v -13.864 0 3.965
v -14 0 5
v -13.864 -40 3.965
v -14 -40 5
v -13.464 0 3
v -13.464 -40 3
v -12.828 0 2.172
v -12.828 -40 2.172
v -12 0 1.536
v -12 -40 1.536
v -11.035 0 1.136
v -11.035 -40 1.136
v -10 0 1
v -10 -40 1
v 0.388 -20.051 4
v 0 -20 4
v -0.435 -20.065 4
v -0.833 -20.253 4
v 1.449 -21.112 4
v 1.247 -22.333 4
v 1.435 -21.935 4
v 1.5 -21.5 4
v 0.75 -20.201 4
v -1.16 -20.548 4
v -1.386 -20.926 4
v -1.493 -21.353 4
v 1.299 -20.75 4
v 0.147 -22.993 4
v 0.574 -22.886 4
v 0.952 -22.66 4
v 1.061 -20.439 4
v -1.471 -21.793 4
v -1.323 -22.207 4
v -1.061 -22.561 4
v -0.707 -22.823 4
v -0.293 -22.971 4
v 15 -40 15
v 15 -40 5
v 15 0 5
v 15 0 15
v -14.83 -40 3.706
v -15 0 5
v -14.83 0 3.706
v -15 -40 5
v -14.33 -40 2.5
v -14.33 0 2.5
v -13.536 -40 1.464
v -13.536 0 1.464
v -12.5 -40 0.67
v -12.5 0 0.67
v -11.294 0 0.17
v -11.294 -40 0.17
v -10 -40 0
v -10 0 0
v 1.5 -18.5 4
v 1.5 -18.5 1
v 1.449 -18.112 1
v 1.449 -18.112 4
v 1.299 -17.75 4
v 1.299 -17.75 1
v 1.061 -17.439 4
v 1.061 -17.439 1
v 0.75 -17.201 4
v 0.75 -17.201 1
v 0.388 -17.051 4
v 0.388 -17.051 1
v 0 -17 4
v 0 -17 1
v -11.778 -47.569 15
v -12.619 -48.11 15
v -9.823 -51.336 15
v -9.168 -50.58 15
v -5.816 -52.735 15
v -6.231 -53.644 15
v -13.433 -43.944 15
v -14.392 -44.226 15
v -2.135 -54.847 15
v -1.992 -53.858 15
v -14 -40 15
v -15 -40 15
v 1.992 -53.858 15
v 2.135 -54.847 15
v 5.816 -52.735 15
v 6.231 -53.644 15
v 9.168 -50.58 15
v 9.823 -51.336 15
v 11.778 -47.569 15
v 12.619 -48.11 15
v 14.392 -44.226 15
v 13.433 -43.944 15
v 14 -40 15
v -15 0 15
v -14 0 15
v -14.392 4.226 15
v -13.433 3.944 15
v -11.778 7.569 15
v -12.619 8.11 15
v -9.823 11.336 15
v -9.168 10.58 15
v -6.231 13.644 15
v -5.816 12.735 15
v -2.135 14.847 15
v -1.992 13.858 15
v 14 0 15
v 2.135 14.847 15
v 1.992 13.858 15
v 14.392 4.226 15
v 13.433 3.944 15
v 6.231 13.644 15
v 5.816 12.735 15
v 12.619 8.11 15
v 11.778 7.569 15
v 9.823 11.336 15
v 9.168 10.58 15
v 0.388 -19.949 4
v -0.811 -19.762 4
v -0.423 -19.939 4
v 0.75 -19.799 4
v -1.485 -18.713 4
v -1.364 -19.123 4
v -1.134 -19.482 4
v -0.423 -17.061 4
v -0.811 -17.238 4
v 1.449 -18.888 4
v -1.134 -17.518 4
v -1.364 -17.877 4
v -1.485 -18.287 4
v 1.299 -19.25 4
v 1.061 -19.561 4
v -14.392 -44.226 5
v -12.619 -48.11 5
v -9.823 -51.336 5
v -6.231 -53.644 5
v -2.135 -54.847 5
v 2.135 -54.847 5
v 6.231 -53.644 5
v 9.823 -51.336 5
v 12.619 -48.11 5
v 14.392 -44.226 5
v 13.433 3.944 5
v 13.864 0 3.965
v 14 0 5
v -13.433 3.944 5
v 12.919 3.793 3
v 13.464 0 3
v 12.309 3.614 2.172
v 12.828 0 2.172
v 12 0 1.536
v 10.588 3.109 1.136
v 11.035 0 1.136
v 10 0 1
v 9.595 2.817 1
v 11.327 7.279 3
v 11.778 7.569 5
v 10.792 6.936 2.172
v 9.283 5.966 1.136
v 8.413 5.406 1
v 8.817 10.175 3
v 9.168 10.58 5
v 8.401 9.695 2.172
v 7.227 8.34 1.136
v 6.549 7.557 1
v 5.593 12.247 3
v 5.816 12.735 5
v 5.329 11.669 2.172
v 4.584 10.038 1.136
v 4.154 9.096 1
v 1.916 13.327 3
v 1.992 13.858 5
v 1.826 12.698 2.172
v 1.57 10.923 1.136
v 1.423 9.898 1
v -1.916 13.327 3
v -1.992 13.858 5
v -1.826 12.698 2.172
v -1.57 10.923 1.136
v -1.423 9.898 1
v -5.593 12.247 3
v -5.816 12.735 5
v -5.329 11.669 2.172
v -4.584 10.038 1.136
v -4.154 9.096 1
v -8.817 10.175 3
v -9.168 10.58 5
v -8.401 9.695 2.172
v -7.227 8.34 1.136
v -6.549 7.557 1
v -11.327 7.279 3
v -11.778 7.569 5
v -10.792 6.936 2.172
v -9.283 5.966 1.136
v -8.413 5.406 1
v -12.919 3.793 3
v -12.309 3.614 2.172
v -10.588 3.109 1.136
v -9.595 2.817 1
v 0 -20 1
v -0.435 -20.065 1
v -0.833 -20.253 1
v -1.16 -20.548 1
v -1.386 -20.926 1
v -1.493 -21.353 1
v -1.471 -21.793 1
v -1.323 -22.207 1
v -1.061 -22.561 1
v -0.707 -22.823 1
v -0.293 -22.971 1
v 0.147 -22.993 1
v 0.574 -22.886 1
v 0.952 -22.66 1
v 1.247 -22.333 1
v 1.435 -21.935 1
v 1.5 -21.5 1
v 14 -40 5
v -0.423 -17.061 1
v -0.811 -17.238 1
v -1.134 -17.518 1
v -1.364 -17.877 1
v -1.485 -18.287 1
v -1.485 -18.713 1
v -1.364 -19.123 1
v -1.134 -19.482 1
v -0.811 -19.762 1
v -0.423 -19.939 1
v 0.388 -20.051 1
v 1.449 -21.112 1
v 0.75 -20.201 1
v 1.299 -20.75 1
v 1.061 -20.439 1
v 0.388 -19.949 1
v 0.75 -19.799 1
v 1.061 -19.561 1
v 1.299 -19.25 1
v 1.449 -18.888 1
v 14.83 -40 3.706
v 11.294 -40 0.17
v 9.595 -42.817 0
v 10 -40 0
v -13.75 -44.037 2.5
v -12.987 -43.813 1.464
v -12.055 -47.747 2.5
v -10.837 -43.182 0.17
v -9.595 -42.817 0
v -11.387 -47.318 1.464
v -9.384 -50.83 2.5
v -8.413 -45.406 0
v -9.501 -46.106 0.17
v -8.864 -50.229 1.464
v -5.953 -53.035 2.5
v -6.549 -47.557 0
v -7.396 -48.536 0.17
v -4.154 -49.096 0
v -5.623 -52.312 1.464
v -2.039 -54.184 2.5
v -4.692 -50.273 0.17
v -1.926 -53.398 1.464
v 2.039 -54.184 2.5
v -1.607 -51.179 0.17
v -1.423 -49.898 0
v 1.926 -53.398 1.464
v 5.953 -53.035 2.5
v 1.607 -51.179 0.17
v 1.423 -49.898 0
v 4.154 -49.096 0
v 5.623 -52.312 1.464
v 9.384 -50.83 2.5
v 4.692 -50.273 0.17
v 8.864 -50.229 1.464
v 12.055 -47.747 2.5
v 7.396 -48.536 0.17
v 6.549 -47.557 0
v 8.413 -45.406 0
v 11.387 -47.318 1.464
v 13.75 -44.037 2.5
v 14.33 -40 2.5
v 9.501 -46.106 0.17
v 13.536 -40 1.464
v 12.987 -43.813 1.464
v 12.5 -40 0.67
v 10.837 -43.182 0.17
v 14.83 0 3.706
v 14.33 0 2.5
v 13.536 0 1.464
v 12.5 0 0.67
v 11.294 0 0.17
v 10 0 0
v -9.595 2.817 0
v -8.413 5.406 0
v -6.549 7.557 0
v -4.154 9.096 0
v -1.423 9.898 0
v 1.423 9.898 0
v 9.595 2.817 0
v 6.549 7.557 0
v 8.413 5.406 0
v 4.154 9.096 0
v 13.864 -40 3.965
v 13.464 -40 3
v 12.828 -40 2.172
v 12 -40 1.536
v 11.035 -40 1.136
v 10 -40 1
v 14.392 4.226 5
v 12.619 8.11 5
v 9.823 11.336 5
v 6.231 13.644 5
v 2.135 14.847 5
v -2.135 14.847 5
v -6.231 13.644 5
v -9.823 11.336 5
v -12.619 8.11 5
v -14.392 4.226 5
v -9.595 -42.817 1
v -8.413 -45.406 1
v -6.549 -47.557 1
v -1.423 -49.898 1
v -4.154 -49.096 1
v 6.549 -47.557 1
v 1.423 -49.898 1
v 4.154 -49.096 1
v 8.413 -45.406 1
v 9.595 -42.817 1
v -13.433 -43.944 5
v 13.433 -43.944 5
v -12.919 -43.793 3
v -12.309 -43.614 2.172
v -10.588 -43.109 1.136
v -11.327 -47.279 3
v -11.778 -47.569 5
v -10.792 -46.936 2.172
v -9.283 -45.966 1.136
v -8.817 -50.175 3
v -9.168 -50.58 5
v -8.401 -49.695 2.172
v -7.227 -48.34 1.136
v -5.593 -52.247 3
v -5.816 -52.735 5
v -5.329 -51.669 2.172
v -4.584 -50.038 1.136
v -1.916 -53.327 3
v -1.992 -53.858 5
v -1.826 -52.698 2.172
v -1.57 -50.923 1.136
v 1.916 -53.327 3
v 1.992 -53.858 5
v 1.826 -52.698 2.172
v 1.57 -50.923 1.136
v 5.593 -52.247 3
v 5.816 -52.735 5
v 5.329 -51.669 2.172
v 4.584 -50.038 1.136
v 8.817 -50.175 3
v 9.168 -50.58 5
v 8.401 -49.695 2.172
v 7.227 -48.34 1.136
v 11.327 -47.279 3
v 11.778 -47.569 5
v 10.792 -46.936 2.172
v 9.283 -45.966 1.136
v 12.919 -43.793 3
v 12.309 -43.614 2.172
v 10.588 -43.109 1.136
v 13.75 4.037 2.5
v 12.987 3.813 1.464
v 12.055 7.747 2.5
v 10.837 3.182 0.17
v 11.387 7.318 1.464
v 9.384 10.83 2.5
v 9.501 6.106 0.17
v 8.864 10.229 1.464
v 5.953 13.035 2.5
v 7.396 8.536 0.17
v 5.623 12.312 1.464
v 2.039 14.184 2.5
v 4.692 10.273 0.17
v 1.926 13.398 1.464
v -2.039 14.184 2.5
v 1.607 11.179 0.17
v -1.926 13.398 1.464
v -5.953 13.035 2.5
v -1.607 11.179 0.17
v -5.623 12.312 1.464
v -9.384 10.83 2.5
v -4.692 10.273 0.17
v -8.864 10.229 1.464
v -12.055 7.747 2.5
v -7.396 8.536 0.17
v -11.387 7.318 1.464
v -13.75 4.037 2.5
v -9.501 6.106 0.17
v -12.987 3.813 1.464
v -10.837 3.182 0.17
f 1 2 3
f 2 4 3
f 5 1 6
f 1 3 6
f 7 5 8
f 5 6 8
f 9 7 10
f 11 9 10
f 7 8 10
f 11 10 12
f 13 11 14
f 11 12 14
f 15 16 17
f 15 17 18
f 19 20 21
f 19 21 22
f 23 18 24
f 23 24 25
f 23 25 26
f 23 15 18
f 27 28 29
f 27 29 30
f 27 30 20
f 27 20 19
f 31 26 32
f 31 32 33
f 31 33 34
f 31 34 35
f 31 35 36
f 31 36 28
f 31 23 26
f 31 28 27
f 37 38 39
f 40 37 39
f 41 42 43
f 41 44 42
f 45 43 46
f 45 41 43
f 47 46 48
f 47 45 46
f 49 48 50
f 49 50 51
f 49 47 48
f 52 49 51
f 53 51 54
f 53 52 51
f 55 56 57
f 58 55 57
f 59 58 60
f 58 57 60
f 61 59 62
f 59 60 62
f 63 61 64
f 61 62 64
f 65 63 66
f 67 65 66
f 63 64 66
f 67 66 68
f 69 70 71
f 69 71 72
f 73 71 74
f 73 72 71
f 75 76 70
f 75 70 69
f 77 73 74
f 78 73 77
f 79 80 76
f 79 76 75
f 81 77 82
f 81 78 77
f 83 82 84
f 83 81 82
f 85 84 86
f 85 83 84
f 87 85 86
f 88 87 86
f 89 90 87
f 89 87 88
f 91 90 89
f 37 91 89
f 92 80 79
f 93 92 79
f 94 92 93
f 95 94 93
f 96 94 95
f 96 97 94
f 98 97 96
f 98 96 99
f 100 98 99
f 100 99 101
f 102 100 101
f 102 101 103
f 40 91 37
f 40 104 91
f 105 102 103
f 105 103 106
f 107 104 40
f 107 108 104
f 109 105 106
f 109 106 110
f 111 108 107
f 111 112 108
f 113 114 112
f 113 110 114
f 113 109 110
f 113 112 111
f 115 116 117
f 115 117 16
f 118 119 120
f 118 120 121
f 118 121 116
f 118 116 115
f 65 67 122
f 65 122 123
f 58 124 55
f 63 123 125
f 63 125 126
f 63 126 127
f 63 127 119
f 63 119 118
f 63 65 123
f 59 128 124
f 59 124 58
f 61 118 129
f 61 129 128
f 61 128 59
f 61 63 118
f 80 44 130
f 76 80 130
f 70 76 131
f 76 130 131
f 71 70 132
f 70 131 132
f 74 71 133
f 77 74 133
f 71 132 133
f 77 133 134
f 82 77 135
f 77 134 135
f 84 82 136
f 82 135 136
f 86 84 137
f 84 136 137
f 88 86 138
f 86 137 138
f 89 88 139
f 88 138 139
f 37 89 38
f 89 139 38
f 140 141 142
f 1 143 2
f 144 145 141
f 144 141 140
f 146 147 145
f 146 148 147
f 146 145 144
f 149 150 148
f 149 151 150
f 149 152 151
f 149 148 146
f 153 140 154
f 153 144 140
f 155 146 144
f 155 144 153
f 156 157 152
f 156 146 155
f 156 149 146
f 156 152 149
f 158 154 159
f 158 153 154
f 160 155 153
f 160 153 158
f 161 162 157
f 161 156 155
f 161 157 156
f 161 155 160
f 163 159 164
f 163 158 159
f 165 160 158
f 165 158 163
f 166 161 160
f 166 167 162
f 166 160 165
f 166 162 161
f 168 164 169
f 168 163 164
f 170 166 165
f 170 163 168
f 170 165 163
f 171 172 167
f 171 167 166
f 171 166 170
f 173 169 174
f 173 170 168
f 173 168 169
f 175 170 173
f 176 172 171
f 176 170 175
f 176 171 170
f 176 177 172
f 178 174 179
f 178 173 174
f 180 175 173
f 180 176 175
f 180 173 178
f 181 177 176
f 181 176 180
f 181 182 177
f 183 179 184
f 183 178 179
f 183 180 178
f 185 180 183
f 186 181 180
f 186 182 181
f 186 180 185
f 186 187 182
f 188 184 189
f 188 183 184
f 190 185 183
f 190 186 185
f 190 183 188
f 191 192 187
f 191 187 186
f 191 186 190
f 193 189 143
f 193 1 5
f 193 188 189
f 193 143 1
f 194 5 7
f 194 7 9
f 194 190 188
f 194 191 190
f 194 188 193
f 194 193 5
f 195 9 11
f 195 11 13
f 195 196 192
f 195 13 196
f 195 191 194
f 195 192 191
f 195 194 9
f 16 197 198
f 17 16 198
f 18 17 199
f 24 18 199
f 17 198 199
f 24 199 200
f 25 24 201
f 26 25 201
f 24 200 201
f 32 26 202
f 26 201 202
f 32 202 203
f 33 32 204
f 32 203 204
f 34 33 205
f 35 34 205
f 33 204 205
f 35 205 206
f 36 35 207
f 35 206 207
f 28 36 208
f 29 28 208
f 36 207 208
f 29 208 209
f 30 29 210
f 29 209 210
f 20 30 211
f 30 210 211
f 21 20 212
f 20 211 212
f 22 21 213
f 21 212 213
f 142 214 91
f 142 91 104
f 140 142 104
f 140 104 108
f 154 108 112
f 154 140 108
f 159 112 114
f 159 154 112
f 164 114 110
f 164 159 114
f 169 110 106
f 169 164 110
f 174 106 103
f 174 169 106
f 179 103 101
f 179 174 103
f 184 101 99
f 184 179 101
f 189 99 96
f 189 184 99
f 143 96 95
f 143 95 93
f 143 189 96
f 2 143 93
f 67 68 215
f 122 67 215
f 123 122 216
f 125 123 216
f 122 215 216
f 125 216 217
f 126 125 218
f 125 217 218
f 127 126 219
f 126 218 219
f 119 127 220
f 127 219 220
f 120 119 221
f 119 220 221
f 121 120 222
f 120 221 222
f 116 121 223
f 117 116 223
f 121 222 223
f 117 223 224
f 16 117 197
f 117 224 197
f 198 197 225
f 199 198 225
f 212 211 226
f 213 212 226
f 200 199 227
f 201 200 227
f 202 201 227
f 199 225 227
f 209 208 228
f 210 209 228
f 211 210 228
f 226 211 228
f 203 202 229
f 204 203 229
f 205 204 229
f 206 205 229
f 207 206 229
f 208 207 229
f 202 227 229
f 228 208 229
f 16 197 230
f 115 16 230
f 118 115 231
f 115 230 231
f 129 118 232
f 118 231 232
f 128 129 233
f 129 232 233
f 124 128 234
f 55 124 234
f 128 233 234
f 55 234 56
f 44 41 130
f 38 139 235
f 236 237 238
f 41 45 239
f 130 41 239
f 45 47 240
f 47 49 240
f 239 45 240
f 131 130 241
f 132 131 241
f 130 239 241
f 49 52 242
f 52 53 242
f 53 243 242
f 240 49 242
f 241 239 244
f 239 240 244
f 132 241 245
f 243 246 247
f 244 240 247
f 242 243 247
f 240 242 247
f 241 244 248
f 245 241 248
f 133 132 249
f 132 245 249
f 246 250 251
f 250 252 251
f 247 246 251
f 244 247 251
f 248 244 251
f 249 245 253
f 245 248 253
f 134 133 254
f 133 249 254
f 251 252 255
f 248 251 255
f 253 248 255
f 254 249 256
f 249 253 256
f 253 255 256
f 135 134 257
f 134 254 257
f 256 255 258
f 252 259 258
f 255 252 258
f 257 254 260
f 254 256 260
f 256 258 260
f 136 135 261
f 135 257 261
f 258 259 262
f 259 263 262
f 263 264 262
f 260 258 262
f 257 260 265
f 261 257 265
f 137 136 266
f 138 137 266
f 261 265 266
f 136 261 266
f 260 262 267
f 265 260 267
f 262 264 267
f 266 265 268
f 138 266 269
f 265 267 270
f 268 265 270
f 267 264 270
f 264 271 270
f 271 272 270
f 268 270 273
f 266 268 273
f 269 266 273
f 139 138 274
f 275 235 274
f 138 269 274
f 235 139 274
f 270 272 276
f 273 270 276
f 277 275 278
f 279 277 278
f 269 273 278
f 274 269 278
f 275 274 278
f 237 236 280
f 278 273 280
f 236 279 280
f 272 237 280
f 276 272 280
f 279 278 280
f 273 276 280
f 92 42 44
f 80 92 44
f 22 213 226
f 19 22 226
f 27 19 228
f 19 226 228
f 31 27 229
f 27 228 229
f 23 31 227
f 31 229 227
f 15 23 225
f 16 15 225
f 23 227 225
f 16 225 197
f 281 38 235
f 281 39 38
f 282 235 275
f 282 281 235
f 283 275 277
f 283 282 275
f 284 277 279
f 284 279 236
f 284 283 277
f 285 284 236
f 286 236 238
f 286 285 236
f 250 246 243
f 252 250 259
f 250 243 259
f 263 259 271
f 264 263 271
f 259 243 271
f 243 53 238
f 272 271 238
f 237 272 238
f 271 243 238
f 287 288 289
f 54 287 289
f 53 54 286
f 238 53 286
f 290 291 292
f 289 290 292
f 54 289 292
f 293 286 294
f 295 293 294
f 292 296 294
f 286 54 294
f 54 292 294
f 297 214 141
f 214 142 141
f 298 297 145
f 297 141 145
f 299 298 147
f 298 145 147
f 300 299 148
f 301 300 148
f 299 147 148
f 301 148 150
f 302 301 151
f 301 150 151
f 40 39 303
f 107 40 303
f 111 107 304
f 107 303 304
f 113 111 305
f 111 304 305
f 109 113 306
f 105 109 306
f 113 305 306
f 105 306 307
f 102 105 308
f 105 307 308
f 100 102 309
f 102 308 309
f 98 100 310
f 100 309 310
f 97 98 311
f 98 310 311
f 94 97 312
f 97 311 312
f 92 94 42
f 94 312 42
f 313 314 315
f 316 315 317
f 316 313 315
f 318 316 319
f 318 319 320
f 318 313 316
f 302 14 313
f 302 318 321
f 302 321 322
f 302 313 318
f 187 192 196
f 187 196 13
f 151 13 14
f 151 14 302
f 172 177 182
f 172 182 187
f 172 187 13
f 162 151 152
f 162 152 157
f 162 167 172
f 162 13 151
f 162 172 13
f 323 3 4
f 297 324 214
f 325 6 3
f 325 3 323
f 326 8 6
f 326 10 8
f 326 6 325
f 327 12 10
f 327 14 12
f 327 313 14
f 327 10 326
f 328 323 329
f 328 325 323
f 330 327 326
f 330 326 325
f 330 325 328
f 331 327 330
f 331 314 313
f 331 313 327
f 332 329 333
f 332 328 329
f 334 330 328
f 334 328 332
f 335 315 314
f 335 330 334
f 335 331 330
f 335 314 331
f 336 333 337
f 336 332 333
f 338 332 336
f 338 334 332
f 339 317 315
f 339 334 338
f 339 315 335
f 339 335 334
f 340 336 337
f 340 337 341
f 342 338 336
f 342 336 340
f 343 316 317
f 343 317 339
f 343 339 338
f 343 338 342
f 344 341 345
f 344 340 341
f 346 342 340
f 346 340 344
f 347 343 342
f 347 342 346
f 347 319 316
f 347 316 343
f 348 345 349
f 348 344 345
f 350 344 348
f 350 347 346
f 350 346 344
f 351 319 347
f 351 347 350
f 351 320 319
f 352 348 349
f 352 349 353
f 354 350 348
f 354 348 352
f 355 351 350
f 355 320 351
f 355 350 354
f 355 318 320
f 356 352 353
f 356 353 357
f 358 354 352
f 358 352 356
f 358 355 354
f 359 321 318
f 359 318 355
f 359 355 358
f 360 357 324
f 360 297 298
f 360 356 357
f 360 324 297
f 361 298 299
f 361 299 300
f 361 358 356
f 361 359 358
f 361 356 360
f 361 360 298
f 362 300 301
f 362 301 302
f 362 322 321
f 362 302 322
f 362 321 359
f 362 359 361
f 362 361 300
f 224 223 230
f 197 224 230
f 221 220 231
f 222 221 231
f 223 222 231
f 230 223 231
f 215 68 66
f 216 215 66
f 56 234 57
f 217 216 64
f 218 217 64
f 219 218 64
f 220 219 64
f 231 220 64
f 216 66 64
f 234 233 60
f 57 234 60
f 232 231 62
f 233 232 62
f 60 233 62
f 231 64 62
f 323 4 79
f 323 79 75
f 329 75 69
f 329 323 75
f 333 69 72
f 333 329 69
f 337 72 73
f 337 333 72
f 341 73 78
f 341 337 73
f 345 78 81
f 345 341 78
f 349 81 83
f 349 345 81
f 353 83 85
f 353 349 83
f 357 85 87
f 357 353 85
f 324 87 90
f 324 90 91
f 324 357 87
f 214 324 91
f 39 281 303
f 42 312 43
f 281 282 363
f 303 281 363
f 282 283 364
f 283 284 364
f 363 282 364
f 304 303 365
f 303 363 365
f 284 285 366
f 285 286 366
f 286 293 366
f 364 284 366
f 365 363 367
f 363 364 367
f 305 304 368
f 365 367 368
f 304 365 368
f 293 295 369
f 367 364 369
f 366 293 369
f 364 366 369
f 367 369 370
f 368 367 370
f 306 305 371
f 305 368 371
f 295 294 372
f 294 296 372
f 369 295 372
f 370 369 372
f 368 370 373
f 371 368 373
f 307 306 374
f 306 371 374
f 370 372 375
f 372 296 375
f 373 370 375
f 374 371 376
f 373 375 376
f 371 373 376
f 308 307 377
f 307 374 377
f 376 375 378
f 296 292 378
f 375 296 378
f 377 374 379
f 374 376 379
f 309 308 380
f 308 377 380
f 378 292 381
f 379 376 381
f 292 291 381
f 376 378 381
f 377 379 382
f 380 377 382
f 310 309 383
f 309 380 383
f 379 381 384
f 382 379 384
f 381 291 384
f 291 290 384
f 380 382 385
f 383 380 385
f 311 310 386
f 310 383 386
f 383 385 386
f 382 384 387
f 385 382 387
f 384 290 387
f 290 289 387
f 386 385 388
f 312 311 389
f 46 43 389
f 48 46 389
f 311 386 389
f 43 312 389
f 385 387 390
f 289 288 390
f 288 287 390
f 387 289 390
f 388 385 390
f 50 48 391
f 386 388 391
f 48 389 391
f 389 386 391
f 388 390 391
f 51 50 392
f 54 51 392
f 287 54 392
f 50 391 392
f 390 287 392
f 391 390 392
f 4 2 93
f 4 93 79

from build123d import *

# Parameters (mm, degrees)
F1_DEPTH = 15
F2_R     = 5
F3_T     = -1
F5_DEPTH = 3


with BuildPart() as f1:
    # F0 (on Top) → F1 (new body)
    with BuildSketch(Plane.XY):
        with BuildLine():
            ThreePointArc((0, -15), (-10.606602, -10.606602), (-15, 0))
            Line((-15, 0), (-15, -40))
            ThreePointArc((-15, -40), (-10.606602, -29.393398), (0, -25))
            Line((0, -25), (0, -15))
        make_face()
        with BuildLine():
            Line((0, 0), (-15, 0))
            ThreePointArc((-15, 0), (-10.606602, -10.606602), (0, -15))
            Line((0, -15), (0, 0))
        make_face()
        with BuildLine():
            ThreePointArc((0, -15), (10.606602, -10.606602), (15, 0))
            Line((15, 0), (0, 0))
            Line((0, 0), (0, -15))
        make_face()
        with BuildLine():
            Line((15, -40), (15, 0))
            ThreePointArc((15, 0), (10.606602, -10.606602), (0, -15))
            Line((0, -15), (0, -25))
            ThreePointArc((0, -25), (10.606602, -29.393398), (15, -40))
        make_face()
        with BuildLine():
            Line((0, -40), (15, -40))
            ThreePointArc((15, -40), (10.606602, -29.393398), (0, -25))
            Line((0, -25), (0, -40))
        make_face()
        with BuildLine():
            ThreePointArc((0, -25), (-10.606602, -29.393398), (-15, -40))
            Line((-15, -40), (0, -40))
            Line((0, -40), (0, -25))
        make_face()
        with BuildLine():
            Line((0, 0), (15, 0))
            ThreePointArc((15, 0), (0, 15), (-15, 0))
            Line((-15, 0), (0, 0))
        make_face()
        with BuildLine():
            ThreePointArc((-15, -40), (0, -55), (15, -40))
            Line((15, -40), (0, -40))
            Line((0, -40), (-15, -40))
        make_face()
    extrude(amount=F1_DEPTH)

    # F2
    f2_edges = [f1.edges().sort_by_distance(p)[0] for p in [
        (0, 15, 0),
    ]]
    fillet(f2_edges, radius=F2_R)

    # F3
    f3_openings = [f1.faces().sort_by_distance(p)[0] for p in [
        (0, -20, 15),
    ]]
    offset(amount=F3_T, openings=f3_openings)


with BuildPart() as f5:
    # F4 (on face) → F5 (new body)
    with BuildSketch(Plane.XY.offset(1)):
        with BuildLine():
            ThreePointArc((1.5, -18.5), (1.06066, -17.43934), (0, -17))
            Line((0, -17), (0, -18.5))
            Line((0, -18.5), (0, -20))
            ThreePointArc((0, -20), (1.06066, -19.56066), (1.5, -18.5))
        make_face()
        with BuildLine():
            Line((0, -18.5), (0, -17))
            ThreePointArc((0, -17), (-1.5, -18.5), (0, -20))
            Line((0, -20), (0, -18.5))
        make_face()
        with BuildLine():
            ThreePointArc((1.5, -21.5), (1.06066, -20.43934), (0, -20))
            ThreePointArc((0, -20), (-1.06066, -22.56066), (1.5, -21.5))
        make_face()
    extrude(amount=F5_DEPTH)


solid = Compound([f1.part, f5.part])
